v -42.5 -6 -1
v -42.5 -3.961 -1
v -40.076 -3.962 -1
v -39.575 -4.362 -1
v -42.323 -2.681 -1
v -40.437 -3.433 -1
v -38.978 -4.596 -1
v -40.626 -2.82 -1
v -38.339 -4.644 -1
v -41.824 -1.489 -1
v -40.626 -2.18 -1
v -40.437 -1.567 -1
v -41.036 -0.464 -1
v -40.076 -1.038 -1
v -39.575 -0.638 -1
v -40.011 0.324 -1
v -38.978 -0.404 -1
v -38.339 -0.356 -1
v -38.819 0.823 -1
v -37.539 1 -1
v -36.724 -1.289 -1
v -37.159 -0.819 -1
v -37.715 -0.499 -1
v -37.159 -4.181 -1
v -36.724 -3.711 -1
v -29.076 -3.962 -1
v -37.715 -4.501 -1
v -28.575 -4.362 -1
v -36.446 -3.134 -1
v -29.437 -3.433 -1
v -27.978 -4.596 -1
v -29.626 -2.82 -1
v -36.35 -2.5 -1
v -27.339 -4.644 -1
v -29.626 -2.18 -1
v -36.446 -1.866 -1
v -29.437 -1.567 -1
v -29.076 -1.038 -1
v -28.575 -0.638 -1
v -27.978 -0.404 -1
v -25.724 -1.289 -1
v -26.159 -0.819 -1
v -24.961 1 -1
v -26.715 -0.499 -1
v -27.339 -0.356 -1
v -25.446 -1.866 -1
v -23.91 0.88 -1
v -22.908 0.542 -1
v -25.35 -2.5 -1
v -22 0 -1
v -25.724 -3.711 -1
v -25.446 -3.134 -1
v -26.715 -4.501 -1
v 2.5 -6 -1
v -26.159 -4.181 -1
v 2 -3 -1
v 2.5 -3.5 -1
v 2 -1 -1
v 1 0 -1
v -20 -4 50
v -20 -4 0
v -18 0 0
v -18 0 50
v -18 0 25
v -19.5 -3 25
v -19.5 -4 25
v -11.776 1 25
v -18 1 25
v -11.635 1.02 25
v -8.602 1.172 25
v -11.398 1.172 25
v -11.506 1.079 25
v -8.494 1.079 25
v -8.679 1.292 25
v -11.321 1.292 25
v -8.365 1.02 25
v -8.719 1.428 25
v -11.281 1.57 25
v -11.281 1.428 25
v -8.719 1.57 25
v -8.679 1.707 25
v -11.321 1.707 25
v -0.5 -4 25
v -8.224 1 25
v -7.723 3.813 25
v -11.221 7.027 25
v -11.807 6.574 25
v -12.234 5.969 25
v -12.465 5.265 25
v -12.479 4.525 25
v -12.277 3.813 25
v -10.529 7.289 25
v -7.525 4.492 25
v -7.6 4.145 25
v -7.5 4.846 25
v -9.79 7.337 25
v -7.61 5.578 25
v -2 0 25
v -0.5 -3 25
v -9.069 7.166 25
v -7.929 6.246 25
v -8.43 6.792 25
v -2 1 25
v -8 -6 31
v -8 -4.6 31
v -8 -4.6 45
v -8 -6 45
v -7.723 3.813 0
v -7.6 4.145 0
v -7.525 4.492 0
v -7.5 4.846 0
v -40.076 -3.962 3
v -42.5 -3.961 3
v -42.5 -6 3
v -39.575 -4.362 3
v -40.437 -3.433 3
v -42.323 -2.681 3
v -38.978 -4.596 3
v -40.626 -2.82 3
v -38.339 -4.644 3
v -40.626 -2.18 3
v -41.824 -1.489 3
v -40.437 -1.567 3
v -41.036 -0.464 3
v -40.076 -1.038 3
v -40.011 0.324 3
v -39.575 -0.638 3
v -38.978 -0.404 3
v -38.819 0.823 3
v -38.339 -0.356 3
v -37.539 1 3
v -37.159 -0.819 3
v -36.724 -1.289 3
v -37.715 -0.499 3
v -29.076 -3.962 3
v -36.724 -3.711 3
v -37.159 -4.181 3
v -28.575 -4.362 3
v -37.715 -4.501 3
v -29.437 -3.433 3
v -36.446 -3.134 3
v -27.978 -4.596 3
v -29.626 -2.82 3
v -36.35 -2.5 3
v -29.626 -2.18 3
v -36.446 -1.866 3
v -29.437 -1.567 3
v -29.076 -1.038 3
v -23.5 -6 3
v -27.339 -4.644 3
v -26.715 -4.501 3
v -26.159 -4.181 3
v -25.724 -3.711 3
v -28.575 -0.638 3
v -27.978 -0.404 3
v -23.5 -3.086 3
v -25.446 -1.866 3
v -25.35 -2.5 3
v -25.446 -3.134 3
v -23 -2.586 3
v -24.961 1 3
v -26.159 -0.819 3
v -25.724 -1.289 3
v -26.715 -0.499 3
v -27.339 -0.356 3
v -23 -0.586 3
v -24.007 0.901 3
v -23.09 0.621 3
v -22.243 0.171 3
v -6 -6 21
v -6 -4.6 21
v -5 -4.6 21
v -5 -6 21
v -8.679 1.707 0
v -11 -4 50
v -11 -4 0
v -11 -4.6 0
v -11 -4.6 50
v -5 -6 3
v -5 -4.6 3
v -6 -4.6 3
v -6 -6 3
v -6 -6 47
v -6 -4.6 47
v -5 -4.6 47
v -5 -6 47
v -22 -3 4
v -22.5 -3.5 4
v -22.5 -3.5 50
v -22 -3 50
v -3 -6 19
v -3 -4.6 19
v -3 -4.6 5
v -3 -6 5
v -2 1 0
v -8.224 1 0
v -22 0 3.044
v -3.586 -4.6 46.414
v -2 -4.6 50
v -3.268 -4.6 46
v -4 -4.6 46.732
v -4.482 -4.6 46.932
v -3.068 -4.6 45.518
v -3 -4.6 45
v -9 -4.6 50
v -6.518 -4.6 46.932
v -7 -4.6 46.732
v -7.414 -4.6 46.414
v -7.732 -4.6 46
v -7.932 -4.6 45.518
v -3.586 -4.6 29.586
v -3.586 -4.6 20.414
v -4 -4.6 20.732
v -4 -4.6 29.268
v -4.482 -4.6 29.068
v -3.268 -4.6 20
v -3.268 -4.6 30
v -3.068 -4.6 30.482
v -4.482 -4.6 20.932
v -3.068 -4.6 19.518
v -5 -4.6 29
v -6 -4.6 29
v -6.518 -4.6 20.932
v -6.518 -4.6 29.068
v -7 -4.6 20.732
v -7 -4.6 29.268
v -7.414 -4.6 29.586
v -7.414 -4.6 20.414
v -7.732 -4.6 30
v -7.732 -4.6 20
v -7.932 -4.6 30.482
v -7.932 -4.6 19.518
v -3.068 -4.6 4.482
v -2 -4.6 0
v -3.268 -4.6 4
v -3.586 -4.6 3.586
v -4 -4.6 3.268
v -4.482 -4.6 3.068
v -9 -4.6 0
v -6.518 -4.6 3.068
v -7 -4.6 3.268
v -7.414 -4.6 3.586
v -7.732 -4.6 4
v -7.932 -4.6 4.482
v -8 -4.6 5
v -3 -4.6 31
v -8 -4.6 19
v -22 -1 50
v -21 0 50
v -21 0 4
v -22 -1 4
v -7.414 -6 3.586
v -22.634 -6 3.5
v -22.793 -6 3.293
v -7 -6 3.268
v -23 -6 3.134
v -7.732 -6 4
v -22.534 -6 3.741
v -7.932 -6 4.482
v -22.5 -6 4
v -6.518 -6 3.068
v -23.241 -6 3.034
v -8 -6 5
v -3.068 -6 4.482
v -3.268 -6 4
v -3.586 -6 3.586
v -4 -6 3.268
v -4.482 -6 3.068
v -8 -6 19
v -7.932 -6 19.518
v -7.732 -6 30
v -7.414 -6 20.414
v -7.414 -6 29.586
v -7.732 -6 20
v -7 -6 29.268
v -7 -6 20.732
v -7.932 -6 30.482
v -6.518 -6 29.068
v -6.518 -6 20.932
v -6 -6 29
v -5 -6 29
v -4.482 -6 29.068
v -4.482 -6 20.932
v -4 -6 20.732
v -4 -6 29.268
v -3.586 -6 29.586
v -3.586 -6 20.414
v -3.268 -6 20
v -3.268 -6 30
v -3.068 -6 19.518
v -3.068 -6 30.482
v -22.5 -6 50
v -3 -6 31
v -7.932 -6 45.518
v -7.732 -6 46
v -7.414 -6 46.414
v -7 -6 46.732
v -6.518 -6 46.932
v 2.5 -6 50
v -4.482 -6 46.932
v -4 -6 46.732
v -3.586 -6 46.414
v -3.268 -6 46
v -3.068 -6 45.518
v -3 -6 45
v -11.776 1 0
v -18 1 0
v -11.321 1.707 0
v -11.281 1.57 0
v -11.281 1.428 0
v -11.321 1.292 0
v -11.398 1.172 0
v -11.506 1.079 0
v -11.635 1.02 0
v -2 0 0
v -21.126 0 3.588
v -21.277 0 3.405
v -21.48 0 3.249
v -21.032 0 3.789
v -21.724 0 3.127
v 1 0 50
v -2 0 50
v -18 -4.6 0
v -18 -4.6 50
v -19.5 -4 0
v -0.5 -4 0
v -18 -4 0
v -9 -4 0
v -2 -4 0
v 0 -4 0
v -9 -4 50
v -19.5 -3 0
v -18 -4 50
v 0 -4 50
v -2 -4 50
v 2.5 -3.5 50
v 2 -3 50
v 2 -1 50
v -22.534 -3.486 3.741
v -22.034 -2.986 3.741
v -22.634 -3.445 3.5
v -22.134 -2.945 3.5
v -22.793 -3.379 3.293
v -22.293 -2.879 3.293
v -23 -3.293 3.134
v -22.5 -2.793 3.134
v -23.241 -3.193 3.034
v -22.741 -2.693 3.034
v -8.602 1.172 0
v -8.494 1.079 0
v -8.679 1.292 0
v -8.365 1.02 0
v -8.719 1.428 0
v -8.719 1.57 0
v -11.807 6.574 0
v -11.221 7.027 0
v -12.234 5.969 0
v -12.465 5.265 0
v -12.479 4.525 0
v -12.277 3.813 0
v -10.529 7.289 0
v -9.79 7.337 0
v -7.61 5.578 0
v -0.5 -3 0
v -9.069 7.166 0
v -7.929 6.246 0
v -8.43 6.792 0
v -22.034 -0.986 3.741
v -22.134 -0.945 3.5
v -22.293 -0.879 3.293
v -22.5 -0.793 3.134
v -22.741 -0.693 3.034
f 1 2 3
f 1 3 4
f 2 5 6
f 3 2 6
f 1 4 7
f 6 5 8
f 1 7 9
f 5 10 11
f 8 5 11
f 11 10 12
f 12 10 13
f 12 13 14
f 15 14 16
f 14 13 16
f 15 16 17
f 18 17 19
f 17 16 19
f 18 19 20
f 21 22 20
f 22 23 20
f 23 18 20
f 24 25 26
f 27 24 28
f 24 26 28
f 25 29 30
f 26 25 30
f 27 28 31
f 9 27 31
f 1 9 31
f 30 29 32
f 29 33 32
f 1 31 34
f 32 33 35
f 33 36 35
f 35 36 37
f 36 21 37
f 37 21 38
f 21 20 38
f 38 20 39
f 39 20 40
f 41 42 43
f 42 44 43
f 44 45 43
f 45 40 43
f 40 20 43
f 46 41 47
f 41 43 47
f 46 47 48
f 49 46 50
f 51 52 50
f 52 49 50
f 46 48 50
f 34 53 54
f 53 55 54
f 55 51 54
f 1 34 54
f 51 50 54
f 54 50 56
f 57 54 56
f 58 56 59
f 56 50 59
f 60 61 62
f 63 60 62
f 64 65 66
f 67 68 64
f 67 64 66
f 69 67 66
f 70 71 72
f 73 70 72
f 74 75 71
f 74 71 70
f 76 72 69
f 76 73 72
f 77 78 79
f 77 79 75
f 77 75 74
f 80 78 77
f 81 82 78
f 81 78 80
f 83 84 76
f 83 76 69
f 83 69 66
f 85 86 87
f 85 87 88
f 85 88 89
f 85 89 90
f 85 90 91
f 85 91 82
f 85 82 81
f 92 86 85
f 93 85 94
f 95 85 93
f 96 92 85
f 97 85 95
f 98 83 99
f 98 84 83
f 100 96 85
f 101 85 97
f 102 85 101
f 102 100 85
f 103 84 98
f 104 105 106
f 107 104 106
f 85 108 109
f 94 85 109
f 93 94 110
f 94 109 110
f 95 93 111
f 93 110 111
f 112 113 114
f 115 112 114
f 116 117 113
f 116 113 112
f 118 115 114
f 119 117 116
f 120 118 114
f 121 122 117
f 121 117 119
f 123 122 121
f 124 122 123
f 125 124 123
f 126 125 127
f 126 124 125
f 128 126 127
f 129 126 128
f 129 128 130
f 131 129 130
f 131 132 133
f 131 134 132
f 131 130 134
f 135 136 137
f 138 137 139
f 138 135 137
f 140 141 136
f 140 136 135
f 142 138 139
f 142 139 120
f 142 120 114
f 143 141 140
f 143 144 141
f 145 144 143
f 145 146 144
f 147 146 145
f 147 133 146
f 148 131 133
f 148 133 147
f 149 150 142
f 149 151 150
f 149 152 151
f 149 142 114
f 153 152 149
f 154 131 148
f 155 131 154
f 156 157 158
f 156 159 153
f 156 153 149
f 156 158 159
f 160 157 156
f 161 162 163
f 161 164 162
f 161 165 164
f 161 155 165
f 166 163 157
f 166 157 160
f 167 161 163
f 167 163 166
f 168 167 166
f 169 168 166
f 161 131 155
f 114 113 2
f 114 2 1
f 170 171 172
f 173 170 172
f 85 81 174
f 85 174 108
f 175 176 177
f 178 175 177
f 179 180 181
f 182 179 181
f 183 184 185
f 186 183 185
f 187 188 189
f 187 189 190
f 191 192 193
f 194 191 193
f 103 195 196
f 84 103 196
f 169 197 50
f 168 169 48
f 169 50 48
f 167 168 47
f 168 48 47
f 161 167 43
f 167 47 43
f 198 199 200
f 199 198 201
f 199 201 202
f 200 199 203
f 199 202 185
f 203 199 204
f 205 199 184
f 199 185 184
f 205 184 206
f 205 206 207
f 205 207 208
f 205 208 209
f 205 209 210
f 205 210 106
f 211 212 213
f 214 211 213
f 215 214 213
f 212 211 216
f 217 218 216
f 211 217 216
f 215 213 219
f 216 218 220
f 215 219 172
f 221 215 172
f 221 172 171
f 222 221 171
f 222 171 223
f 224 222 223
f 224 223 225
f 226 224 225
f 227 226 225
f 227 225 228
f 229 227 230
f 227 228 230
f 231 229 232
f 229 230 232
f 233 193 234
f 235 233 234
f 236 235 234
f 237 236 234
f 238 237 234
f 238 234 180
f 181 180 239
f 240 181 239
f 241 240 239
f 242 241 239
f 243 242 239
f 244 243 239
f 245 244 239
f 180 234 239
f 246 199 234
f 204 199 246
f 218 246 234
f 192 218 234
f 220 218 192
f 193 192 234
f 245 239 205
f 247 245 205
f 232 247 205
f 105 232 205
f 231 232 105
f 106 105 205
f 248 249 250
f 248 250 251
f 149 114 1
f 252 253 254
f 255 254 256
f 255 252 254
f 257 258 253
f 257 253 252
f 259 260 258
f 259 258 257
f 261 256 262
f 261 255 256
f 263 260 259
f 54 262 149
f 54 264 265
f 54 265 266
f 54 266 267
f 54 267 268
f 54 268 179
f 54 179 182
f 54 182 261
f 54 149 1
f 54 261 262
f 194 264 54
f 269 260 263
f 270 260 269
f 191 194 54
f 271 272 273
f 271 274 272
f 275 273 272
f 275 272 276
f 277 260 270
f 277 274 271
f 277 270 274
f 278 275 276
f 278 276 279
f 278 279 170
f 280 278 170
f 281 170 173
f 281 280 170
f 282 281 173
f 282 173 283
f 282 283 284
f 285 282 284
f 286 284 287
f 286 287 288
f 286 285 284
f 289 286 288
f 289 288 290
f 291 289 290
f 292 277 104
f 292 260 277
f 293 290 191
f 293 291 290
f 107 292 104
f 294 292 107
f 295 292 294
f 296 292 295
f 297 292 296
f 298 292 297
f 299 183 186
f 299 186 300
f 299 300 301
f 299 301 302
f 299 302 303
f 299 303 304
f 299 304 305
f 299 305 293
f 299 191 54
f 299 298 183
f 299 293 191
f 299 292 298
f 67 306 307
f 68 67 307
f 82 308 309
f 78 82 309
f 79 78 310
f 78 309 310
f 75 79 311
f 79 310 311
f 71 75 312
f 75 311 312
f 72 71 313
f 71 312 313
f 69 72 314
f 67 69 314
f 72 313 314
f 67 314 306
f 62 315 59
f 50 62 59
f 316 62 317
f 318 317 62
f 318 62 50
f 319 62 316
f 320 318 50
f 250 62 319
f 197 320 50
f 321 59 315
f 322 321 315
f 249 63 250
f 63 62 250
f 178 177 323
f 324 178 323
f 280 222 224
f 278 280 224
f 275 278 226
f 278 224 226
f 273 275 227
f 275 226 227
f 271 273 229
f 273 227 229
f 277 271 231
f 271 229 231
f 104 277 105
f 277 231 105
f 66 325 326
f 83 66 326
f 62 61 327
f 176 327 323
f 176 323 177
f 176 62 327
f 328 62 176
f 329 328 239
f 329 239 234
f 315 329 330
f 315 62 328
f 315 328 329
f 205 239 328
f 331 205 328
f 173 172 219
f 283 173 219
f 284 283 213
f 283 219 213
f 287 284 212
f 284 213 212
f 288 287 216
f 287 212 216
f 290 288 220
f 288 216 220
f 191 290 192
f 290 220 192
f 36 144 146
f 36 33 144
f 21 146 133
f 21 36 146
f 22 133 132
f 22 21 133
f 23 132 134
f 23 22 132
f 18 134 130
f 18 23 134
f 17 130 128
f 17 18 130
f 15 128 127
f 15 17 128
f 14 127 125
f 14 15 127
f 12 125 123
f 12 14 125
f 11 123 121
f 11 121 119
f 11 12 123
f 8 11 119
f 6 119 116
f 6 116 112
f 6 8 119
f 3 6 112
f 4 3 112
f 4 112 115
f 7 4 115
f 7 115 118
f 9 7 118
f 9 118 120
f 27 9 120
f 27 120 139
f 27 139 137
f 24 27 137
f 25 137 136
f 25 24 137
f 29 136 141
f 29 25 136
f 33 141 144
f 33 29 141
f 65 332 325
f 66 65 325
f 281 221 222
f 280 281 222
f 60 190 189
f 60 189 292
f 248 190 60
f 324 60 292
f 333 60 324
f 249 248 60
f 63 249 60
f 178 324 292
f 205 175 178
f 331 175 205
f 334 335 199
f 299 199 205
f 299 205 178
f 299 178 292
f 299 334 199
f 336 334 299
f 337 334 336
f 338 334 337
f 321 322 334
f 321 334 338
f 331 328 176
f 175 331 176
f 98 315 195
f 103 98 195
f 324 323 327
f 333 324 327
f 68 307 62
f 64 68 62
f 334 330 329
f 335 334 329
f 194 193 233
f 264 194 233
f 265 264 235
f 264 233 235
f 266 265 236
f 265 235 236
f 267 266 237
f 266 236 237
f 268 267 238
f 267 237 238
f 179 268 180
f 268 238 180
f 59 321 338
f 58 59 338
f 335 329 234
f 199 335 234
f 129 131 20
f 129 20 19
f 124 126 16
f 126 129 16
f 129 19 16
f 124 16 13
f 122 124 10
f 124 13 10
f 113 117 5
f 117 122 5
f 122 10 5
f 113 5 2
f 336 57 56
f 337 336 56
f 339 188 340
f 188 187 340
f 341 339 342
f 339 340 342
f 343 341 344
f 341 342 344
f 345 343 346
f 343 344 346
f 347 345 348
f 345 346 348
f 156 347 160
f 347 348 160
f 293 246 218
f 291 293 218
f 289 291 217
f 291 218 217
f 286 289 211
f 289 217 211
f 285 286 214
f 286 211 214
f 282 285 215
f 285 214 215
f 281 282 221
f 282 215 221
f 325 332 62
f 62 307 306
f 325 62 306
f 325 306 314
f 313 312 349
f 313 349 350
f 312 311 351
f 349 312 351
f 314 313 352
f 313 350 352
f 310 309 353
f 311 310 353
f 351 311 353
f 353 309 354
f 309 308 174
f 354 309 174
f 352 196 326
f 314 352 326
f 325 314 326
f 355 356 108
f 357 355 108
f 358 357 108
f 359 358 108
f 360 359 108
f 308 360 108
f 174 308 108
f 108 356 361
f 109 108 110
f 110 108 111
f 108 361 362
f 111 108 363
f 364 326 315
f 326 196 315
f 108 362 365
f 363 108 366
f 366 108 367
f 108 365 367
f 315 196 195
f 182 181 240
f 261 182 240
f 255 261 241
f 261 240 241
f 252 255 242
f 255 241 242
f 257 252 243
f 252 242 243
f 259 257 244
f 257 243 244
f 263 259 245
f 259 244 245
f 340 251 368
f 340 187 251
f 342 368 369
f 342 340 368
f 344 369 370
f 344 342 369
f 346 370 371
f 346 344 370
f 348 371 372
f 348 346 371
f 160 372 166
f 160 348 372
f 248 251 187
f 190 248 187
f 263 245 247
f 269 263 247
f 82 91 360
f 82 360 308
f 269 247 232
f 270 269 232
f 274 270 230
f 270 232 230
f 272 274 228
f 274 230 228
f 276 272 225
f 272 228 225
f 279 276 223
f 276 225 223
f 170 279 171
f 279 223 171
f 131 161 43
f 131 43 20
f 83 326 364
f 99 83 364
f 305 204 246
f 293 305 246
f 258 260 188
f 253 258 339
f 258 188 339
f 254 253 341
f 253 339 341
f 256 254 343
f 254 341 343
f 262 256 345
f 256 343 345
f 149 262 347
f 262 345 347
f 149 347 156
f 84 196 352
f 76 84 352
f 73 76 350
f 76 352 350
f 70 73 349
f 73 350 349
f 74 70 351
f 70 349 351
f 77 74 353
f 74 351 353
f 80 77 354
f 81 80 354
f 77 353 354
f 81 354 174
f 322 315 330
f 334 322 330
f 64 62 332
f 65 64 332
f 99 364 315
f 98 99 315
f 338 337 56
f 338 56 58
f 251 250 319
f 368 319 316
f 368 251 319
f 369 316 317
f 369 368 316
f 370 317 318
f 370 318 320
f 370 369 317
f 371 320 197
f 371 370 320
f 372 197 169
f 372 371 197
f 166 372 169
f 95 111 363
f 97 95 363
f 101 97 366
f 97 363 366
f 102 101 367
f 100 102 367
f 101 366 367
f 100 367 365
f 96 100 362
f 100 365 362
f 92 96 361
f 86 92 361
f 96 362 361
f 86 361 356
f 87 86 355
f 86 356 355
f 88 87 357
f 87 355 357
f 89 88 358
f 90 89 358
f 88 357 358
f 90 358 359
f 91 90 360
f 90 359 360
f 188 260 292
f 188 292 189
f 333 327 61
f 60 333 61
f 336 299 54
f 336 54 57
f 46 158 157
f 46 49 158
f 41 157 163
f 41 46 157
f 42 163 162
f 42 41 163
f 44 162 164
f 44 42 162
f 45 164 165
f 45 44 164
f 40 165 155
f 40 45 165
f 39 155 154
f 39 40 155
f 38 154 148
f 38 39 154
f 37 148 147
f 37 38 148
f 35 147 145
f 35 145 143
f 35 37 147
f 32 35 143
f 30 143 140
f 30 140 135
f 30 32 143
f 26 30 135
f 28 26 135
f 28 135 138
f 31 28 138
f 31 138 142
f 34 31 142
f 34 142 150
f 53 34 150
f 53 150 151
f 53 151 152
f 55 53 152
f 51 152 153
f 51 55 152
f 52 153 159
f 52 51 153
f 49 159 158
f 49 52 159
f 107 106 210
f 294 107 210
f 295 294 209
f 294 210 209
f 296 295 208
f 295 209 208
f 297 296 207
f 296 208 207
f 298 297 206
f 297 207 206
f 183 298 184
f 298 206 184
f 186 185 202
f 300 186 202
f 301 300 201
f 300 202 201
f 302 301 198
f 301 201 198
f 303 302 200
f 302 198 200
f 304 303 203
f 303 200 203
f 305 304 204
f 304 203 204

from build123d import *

# Parameters (mm, degrees)
F1_DEPTH      = 50
F0_W          = 7
F0_H          = 0.6
F2_DEPTH      = 1
F3_T4_DEPTH   = 51
F3_T9_DEPTH   = 51
F3_T11_DEPTH  = 56.1433659759
F5_DEPTH      = 25
F6_DEPTH      = 25
F0_R          = 2.15
F7_DEPTH      = 3
F7_DEPTH_BACK = 1
F8_R          = 1
F9_T1_DEPTH   = 18.9997500167
F9_T3_DEPTH   = 28.9992500113


# Not quite as in the source:
# - a fillet or chamfer that OpenCascade refuses, or shapes differently, is made with other operations: its cross-section is extruded or revolved along the edge and cut away or added


with BuildPart() as f1:
    # F0 (on Top) → F1 (new body)
    with BuildSketch(Plane.XY):
        Polygon((2, 0), (0, 0), (-2, 0), (-0.5, -3), (0, -4), (2, -4), align=None)
        Polygon((-19.5, -3), (-18, 0), (-20, 0), (-22, 0), (-22, -4), (-20, -4), align=None)
        Polygon((2.5, -4), (2, -4), (0, -4), (-0.5, -4), (-2, -4), (-2, -4.6), (-9, -4.6), (-9, -4), (-11, -4), (-11, -4.6), (-18, -4.6), (-18, -4), (-19.5, -4), (-20, -4), (-22, -4), (-22.5, -4), (-22.5, -6), (2.5, -6), align=None)
    extrude(amount=F1_DEPTH)

    # F0 (on Top) + F1_face (on face) → F2 (join)
    with BuildSketch(Plane.XY):
        Polygon((2, 0), (0, 0), (-2, 0), (-0.5, -3), (0, -4), (2, -4), align=None)
        Polygon((-0.5, -3), (-2, 0), (-18, 0), (-19.5, -3), (-19.5, -4), (-18, -4), (-11, -4), (-9, -4), (-2, -4), (-0.5, -4), align=None)
        Polygon((0, -4), (-0.5, -3), (-0.5, -4), align=None)
        Polygon((-19.5, -4), (-19.5, -3), (-20, -4), align=None)
        with Locations((-5.5, -4.3)):
            Rectangle(F0_W, F0_H)
        with Locations((-14.5, -4.3)):
            Rectangle(F0_W, F0_H)
    with BuildSketch(Plane(origin=(-10, -3.9107723577, 0), x_dir=(1, 0, 0), z_dir=(0, 0, -1))):
        Polygon((8, -3.9107723577), (12, -3.9107723577), (12, 0.0892276423), (12.5, 0.0892276423), (12.5, 2.0892276423), (-12.5, 2.0892276423), (-12.5, 0.0892276423), (-12, 0.0892276423), (-12, -3.9107723577), (-8, -3.9107723577), (-10, 0.0892276423), (-8, 0.0892276423), (-8, 0.6892276423), (-1, 0.6892276423), (-1, 0.0892276423), (1, 0.0892276423), (1, 0.6892276423), (8, 0.6892276423), (8, 0.0892276423), (10, 0.0892276423), align=None)
    extrude(amount=-F2_DEPTH, dir=(0, 0, 1))

    # F3: chamfer of 1 on 4 edges, made by hand


with BuildPart() as f3_tool2:
    # F3_s3 → F3_t4 (new body)
    with BuildSketch(Plane.XY.offset(-1)):
        Polygon((-23, -4), (-22, -3), (-22, -4), align=None)
    extrude(amount=F3_T4_DEPTH)

    split(bisect_by=Plane.YZ.offset(-22.5), keep=Keep.TOP)


with BuildPart() as f1_1:
    add(f1.part)

    # F3_t1: union F3_tool2
    add(f3_tool2.part)


with BuildPart() as f3_tool7:
    # F3_s8 → F3_t9 (new body)
    with BuildSketch(Plane.XY.offset(50)):
        Polygon((3, -4), (2, -3), (2, -4), align=None)
    extrude(amount=-F3_T9_DEPTH)

    split(bisect_by=Plane.YZ.offset(2.5), keep=Keep.BOTTOM)


with BuildPart() as f1_2:
    add(f1_1.part)

    # F3_t6: union F3_tool7
    add(f3_tool7.part)

    # F3_s12 → F3_t11 (cut)
    with BuildSketch(Plane.XY.offset(-3.571682988)):
        Polygon((-21, 0), (-22, -1), (-22, 0), align=None)
        Polygon((1, 0), (2, -1), (2, 0), align=None)
    extrude(amount=F3_T11_DEPTH, mode=Mode.SUBTRACT)

    # F4 (on face) → F5 (cut)
    with BuildSketch(Plane(origin=(0, -4, 0), x_dir=(-1, 0, 0), z_dir=(0, 1, 0))):
        with BuildLine():
            ThreePointArc((8, 45), (7.4142135624, 46.4142135624), (6, 47))
            Line((6, 47), (5, 47))
            ThreePointArc((5, 47), (3.5857864376, 46.4142135624), (3, 45))
            Line((3, 45), (3, 31))
            ThreePointArc((3, 31), (3.5857864376, 29.5857864376), (5, 29))
            Line((5, 29), (6, 29))
            ThreePointArc((6, 29), (7.4142135624, 29.5857864376), (8, 31))
            Line((8, 31), (8, 45))
        make_face()
        with BuildLine():
            ThreePointArc((8, 19), (7.4142135624, 20.4142135624), (6, 21))
            Line((6, 21), (5, 21))
            ThreePointArc((5, 21), (3.5857864376, 20.4142135624), (3, 19))
            Line((3, 19), (3, 5))
            ThreePointArc((3, 5), (3.5857864376, 3.5857864376), (5, 3))
            Line((5, 3), (6, 3))
            ThreePointArc((6, 3), (7.4142135624, 3.5857864376), (8, 5))
            Line((8, 5), (8, 19))
        make_face()
    extrude(amount=-F5_DEPTH, mode=Mode.SUBTRACT)

    # F0 (on Top) → F7 (join, two sides)
    with BuildSketch(Plane.XY) as f7_sk:
        Polygon((-22, -4), (-22, 0), (-22, 1), (-42.5, 1), (-42.5, -6), (-22.5, -6), (-22.5, -4), align=None)
        with Locations((-38.5, -2.5)):
            Circle(F0_R, mode=Mode.SUBTRACT)
        with Locations((-27.5, -2.5)):
            Circle(F0_R, mode=Mode.SUBTRACT)
        Polygon((-19.5, -3), (-18, 0), (-20, 0), (-22, 0), (-22, -4), (-20, -4), align=None)
    extrude(amount=F7_DEPTH)
    extrude(f7_sk.sketch, amount=-F7_DEPTH_BACK)

    # F8
    f8_edges = [f1_2.edges().sort_by_distance(p)[0] for p in [
        (-22.5, -4.75, 3),
        (-22.25, -3.25, 3),
        (-22, -2, 3),
        (-21.5, -0.5, 3),
    ]]
    fillet(f8_edges, radius=F8_R)

    # F9: fillet of radius 5 on 2 edges, made by hand

    # F9_s2 → F9_t1 (cut)
    with BuildSketch(Plane.XY.offset(-8.4998750083)):
        with BuildLine():
            ThreePointArc((-21.9999099988, 0.0001199991), (-23.4187874519, 0.7435585843), (-24.9999499996, 1.00015))
            Line((-24.9999499996, 1.00015), (-24.9999499996, 1.10015))
            ThreePointArc((-24.9999499996, 1.10015), (-23.4999749998, 1.1), (-22, 1.1))
            Line((-22, 1.1), (-21.9, 1))
            ThreePointArc((-21.9, 1), (-21.9, 0.5000599995), (-21.9399091988, 0.0801193991))
            Line((-21.9399091988, 0.0801193991), (-21.9999099988, 0.0001199991))
        make_face()
    extrude(amount=F9_T1_DEPTH, mode=Mode.SUBTRACT)

    # F9_s4 → F9_t3 (cut)
    with BuildSketch(Plane.XY.offset(-13.4996250056)):
        with BuildLine():
            ThreePointArc((-37.50015, 1.00015), (-41.0356839059, -0.4643160941), (-42.50015, -3.99985))
            Line((-42.50015, -3.99985), (-42.60015, -3.99985))
            ThreePointArc((-42.60015, -3.99985), (-42.6, -1.499925), (-42.6, 1))
            Line((-42.6, 1), (-42.5, 1.1))
            ThreePointArc((-42.5, 1.1), (-40.000075, 1.1), (-37.50015, 1.10015))
            Line((-37.50015, 1.10015), (-37.50015, 1.00015))
        make_face()
    extrude(amount=F9_T3_DEPTH, mode=Mode.SUBTRACT)


with BuildPart() as f6:
    # F0 (on Top) → F6 (new body)
    with BuildSketch(Plane.XY):
        with BuildLine():
            ThreePointArc((-12.2765340768, 3.8128364101), (-10, 2.3459833488), (-7.7234659232, 3.8128364101))
            ThreePointArc((-7.7234659232, 3.8128364101), (-7.5565050448, 4.317464282), (-7.5, 4.8459833488))
            ThreePointArc((-7.5, 4.8459833488), (-10.5285190668, 7.289478304), (-12.2765340768, 3.8128364101))
        make_face()
        with BuildLine():
            Line((-18, 0), (-2, 0))
            Line((-2, 0), (-2, 1))
            Line((-2, 1), (-8.2240074562, 1))
            ThreePointArc((-8.2240074562, 1), (-8.6443137099, 1.2291815127), (-8.6793142716, 1.7066293877))
            Line((-8.6793142716, 1.7066293877), (-7.7234659232, 3.8128364101))
            ThreePointArc((-7.7234659232, 3.8128364101), (-10, 2.3459833488), (-12.2765340768, 3.8128364101))
            Line((-12.2765340768, 3.8128364101), (-11.3206857284, 1.7066293877))
            ThreePointArc((-11.3206857284, 1.7066293877), (-11.3556862901, 1.2291815127), (-11.7759925438, 1))
            Line((-11.7759925438, 1), (-18, 1))
            Line((-18, 1), (-18, 0))
        make_face()
        Polygon((-0.5, -3), (-2, 0), (-18, 0), (-19.5, -3), (-19.5, -4), (-18, -4), (-11, -4), (-9, -4), (-2, -4), (-0.5, -4), align=None)
    extrude(amount=F6_DEPTH)


solid = Compound([f1_2.part, f6.part])
